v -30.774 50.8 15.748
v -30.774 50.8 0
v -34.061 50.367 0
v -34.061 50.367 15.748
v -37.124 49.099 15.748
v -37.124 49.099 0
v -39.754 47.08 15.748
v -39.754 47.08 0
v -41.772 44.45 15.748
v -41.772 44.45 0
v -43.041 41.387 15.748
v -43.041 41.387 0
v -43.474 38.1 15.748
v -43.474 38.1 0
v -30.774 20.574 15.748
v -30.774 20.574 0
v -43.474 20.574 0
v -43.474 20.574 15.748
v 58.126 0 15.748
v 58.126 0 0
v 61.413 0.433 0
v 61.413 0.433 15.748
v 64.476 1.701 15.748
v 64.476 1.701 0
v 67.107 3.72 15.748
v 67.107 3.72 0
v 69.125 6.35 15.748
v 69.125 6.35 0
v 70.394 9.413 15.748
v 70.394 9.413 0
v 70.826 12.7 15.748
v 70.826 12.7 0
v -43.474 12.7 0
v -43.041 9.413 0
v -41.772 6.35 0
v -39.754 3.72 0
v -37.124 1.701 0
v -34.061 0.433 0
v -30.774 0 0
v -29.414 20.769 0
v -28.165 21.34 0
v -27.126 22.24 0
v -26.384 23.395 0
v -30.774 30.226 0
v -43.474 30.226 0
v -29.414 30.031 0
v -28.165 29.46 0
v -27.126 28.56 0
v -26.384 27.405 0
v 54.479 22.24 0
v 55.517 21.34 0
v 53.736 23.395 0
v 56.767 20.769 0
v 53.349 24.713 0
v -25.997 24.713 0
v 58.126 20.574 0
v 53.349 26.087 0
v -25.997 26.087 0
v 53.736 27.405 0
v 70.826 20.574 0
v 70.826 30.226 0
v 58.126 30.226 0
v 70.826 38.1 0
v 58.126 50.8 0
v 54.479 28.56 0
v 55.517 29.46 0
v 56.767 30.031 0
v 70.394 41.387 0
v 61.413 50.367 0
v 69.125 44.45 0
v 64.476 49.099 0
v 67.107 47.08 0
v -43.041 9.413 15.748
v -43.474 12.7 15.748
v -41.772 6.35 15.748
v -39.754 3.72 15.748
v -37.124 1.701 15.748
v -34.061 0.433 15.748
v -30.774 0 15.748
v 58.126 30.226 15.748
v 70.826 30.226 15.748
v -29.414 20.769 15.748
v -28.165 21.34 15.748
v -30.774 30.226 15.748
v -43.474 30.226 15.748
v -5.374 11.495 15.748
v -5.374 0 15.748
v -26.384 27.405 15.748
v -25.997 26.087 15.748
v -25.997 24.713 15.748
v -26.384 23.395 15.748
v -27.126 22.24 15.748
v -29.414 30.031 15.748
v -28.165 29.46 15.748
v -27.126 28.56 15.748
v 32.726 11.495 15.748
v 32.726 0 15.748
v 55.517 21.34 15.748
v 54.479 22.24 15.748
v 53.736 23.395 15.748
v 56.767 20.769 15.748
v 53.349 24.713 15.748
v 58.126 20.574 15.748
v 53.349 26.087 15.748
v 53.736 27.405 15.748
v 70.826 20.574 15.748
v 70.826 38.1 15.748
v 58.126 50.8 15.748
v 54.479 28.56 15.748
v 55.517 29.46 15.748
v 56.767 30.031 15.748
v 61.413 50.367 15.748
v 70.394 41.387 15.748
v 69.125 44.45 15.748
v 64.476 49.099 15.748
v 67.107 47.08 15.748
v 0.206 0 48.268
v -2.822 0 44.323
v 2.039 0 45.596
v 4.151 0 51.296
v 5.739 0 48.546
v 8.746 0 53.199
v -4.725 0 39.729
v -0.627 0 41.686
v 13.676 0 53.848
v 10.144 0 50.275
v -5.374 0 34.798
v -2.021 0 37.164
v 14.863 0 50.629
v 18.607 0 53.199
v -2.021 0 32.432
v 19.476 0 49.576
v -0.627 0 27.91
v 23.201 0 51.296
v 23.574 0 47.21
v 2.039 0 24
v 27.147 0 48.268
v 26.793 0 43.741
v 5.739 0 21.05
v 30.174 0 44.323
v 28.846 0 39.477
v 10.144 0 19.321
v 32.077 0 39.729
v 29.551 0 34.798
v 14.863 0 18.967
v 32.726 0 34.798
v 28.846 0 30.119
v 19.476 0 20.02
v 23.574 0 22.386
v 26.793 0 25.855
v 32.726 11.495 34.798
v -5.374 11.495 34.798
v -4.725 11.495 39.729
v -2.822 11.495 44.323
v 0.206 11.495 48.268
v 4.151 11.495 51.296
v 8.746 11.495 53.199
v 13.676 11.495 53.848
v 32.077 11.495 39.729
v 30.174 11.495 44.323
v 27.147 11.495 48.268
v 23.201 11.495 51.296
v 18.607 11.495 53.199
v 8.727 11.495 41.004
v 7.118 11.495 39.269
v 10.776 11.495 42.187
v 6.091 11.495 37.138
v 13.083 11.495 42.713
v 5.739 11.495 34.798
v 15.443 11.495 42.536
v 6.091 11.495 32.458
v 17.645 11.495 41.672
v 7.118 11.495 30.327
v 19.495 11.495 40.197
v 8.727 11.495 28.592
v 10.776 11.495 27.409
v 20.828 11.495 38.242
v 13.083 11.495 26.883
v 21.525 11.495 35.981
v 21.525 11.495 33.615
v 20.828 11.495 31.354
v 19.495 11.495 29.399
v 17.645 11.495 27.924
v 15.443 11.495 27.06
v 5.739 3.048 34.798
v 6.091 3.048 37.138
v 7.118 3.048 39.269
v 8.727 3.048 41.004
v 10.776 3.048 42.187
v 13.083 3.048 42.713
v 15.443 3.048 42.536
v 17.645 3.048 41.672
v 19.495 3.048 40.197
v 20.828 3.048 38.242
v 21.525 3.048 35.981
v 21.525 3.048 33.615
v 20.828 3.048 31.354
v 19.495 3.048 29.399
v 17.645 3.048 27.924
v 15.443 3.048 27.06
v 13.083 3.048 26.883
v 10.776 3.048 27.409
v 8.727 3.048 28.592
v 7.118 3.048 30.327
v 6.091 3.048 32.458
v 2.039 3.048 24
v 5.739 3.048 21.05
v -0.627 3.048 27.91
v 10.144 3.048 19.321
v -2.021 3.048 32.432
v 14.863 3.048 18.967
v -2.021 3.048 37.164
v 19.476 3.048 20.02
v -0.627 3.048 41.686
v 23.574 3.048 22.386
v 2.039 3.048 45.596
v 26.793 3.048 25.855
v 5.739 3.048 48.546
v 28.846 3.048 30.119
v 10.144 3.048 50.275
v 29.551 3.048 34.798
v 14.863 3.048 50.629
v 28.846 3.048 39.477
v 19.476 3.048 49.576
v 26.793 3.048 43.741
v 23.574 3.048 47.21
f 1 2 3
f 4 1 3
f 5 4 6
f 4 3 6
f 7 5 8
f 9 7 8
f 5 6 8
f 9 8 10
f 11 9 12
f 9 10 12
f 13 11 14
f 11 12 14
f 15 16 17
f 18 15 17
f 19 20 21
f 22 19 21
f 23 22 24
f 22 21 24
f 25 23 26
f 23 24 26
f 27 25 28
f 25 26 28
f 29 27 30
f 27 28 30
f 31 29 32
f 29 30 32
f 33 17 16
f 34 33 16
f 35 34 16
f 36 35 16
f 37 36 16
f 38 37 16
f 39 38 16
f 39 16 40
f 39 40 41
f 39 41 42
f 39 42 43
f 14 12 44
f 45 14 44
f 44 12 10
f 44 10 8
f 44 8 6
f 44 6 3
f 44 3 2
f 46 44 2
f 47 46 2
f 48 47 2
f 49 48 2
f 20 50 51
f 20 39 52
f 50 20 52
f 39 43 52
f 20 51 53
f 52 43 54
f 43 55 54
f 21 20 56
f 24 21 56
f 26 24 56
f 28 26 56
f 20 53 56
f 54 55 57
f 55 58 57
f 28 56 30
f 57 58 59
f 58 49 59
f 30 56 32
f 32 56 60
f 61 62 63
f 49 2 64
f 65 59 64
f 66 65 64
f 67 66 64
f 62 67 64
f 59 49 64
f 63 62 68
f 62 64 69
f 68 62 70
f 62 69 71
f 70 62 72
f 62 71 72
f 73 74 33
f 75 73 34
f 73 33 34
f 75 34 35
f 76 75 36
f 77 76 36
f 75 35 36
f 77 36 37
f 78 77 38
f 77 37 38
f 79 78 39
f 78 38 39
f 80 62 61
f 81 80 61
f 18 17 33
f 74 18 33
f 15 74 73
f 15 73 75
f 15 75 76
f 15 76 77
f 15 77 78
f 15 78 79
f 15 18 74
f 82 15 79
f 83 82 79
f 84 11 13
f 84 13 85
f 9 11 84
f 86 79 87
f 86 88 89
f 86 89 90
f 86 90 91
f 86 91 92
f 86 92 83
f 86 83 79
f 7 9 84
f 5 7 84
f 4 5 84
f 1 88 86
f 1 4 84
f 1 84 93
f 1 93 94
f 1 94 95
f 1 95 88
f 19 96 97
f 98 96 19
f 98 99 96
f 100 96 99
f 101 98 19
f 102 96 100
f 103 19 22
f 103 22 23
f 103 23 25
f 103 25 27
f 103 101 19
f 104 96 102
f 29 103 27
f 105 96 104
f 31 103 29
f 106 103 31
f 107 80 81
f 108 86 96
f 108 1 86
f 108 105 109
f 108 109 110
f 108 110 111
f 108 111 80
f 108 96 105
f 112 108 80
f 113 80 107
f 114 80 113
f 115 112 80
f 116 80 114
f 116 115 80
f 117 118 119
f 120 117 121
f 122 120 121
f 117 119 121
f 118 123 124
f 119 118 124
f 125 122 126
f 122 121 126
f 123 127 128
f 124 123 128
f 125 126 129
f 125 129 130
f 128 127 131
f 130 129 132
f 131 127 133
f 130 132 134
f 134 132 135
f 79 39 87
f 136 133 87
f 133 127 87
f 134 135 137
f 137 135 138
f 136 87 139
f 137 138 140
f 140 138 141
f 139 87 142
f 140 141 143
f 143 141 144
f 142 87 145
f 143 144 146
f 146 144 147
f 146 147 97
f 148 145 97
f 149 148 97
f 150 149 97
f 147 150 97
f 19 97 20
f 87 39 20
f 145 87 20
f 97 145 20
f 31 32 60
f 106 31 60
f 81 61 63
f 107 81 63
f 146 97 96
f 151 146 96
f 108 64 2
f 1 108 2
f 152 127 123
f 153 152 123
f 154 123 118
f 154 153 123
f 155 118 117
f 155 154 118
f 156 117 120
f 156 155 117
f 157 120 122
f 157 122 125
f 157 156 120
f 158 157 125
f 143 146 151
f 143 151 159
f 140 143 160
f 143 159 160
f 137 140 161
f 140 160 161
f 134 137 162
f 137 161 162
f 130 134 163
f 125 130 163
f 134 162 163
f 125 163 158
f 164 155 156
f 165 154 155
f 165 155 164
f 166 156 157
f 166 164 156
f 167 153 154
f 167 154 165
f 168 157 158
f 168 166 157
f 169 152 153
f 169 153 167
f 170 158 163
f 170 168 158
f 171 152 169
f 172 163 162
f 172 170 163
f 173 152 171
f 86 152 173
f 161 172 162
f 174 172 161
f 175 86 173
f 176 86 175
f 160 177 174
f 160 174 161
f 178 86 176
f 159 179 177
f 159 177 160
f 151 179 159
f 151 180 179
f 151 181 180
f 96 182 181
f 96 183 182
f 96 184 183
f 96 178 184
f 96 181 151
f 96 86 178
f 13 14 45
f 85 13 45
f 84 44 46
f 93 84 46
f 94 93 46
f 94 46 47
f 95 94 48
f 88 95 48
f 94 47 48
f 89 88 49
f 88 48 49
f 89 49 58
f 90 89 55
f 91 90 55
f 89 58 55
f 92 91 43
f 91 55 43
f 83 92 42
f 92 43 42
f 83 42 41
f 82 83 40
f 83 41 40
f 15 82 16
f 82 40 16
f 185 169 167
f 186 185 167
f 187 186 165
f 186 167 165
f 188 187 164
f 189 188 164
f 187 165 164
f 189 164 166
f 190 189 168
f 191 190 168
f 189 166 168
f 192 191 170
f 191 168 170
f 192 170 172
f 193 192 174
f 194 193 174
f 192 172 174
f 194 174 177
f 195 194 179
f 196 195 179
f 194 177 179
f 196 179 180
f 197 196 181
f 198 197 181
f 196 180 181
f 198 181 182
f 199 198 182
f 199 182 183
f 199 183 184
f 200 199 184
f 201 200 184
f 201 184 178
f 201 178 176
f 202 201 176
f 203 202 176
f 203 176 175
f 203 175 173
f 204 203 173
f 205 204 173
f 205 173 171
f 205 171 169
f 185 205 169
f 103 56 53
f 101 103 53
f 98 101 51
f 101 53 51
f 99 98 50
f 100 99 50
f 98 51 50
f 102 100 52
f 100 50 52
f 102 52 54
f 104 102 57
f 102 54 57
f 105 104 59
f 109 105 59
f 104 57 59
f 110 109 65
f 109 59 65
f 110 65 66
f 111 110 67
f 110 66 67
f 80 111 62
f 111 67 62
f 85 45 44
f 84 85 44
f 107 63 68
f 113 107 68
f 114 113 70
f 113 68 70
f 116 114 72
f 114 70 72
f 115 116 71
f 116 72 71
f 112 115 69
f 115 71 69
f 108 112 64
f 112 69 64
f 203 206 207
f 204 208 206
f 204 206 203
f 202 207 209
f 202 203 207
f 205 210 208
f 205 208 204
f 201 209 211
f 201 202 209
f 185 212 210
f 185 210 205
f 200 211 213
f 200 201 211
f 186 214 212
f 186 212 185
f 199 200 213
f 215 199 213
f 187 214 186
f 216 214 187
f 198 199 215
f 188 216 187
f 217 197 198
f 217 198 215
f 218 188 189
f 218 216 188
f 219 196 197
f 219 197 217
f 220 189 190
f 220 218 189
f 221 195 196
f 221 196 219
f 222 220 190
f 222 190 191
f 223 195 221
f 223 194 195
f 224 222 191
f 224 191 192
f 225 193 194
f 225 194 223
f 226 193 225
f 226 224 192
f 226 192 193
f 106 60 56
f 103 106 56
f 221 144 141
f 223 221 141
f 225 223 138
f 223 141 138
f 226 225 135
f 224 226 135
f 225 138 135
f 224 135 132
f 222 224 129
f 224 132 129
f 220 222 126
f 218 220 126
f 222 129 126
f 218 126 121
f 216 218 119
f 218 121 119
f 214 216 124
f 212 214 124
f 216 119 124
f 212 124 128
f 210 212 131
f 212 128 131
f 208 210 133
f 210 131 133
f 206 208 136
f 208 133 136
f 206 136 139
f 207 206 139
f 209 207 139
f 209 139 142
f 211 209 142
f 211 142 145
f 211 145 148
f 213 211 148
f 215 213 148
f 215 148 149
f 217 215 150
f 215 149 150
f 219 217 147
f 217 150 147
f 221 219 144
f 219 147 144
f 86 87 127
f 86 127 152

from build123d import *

# Parameters (mm, degrees)
F1_DEPTH = 15.748
F2_W     = 38.1
F2_H     = 11.4949838928
F3_DEPTH = 38.1
F4_R     = 19.04999
F6_D     = 15.875
F7_R     = 15.875
F7_R_2   = 7.9375
F8_DEPTH = 3.048


# Not quite as in the source:
# - a fillet or chamfer is up to 0.001 mm smaller than in the source, because OpenCascade refuses the exact size


with BuildPart() as f1:
    # F0 (on Top) → F1 (new body)
    with BuildSketch(Plane.XY):
        with BuildLine():
            Line((-30.7737162879, 0), (58.1262837121, 0))
            ThreePointArc((58.1262837121, 0), (67.1065398331, 3.7197438789), (70.8262837121, 12.7))
            Line((70.8262837121, 12.7), (70.8262837121, 20.574))
            Line((70.8262837121, 20.574), (58.1262837121, 20.574))
            ThreePointArc((58.1262837121, 20.574), (53.3002837121, 25.4), (58.1262837121, 30.226))
            Line((58.1262837121, 30.226), (70.8262837121, 30.226))
            Line((70.8262837121, 30.226), (70.8262837121, 38.1))
            ThreePointArc((70.8262837121, 38.1), (67.1065398331, 47.0802561211), (58.1262837121, 50.8))
            Line((58.1262837121, 50.8), (-30.7737162879, 50.8))
            ThreePointArc((-30.7737162879, 50.8), (-39.753972409, 47.0802561211), (-43.4737162879, 38.1))
            Line((-43.4737162879, 38.1), (-43.4737162879, 30.226))
            Line((-43.4737162879, 30.226), (-30.7737162879, 30.226))
            ThreePointArc((-30.7737162879, 30.226), (-25.9477162879, 25.4), (-30.7737162879, 20.574))
            Line((-30.7737162879, 20.574), (-43.4737162879, 20.574))
            Line((-43.4737162879, 20.574), (-43.4737162879, 12.7))
            ThreePointArc((-43.4737162879, 12.7), (-39.753972409, 3.7197438789), (-30.7737162879, 0))
        make_face()
    extrude(amount=F1_DEPTH)

    # F2 (on face) → F3 (join)
    with BuildSketch(Plane.XY.offset(15.748)):
        with Locations((13.6762837121, 5.7474919464)):
            Rectangle(F2_W, F2_H)
    extrude(amount=F3_DEPTH)

    # F4 (radius 19.05 in the source; OpenCascade refuses exactly that, so slightly less here)
    f4_edges = [f1.edges().sort_by_distance(p)[0] for p in [
        (-5.373716, 5.747492, 53.848),
        (32.726284, 5.747492, 53.848),
    ]]
    fillet(f4_edges, radius=F4_R)

    # F6 (through all)
    with Locations(Plane.XZ):
        with Locations((13.6762837121, 34.798)):
            Hole(F6_D / 2)

    # F7 (on face) → F8 (cut)
    with BuildSketch(Plane.XZ):
        with Locations((13.6762837121, 34.798)):
            Circle(F7_R)
        with Locations((13.6762837121, 34.798)):
            Circle(F7_R_2, mode=Mode.SUBTRACT)
    extrude(amount=-F8_DEPTH, mode=Mode.SUBTRACT)


solid = f1.part
